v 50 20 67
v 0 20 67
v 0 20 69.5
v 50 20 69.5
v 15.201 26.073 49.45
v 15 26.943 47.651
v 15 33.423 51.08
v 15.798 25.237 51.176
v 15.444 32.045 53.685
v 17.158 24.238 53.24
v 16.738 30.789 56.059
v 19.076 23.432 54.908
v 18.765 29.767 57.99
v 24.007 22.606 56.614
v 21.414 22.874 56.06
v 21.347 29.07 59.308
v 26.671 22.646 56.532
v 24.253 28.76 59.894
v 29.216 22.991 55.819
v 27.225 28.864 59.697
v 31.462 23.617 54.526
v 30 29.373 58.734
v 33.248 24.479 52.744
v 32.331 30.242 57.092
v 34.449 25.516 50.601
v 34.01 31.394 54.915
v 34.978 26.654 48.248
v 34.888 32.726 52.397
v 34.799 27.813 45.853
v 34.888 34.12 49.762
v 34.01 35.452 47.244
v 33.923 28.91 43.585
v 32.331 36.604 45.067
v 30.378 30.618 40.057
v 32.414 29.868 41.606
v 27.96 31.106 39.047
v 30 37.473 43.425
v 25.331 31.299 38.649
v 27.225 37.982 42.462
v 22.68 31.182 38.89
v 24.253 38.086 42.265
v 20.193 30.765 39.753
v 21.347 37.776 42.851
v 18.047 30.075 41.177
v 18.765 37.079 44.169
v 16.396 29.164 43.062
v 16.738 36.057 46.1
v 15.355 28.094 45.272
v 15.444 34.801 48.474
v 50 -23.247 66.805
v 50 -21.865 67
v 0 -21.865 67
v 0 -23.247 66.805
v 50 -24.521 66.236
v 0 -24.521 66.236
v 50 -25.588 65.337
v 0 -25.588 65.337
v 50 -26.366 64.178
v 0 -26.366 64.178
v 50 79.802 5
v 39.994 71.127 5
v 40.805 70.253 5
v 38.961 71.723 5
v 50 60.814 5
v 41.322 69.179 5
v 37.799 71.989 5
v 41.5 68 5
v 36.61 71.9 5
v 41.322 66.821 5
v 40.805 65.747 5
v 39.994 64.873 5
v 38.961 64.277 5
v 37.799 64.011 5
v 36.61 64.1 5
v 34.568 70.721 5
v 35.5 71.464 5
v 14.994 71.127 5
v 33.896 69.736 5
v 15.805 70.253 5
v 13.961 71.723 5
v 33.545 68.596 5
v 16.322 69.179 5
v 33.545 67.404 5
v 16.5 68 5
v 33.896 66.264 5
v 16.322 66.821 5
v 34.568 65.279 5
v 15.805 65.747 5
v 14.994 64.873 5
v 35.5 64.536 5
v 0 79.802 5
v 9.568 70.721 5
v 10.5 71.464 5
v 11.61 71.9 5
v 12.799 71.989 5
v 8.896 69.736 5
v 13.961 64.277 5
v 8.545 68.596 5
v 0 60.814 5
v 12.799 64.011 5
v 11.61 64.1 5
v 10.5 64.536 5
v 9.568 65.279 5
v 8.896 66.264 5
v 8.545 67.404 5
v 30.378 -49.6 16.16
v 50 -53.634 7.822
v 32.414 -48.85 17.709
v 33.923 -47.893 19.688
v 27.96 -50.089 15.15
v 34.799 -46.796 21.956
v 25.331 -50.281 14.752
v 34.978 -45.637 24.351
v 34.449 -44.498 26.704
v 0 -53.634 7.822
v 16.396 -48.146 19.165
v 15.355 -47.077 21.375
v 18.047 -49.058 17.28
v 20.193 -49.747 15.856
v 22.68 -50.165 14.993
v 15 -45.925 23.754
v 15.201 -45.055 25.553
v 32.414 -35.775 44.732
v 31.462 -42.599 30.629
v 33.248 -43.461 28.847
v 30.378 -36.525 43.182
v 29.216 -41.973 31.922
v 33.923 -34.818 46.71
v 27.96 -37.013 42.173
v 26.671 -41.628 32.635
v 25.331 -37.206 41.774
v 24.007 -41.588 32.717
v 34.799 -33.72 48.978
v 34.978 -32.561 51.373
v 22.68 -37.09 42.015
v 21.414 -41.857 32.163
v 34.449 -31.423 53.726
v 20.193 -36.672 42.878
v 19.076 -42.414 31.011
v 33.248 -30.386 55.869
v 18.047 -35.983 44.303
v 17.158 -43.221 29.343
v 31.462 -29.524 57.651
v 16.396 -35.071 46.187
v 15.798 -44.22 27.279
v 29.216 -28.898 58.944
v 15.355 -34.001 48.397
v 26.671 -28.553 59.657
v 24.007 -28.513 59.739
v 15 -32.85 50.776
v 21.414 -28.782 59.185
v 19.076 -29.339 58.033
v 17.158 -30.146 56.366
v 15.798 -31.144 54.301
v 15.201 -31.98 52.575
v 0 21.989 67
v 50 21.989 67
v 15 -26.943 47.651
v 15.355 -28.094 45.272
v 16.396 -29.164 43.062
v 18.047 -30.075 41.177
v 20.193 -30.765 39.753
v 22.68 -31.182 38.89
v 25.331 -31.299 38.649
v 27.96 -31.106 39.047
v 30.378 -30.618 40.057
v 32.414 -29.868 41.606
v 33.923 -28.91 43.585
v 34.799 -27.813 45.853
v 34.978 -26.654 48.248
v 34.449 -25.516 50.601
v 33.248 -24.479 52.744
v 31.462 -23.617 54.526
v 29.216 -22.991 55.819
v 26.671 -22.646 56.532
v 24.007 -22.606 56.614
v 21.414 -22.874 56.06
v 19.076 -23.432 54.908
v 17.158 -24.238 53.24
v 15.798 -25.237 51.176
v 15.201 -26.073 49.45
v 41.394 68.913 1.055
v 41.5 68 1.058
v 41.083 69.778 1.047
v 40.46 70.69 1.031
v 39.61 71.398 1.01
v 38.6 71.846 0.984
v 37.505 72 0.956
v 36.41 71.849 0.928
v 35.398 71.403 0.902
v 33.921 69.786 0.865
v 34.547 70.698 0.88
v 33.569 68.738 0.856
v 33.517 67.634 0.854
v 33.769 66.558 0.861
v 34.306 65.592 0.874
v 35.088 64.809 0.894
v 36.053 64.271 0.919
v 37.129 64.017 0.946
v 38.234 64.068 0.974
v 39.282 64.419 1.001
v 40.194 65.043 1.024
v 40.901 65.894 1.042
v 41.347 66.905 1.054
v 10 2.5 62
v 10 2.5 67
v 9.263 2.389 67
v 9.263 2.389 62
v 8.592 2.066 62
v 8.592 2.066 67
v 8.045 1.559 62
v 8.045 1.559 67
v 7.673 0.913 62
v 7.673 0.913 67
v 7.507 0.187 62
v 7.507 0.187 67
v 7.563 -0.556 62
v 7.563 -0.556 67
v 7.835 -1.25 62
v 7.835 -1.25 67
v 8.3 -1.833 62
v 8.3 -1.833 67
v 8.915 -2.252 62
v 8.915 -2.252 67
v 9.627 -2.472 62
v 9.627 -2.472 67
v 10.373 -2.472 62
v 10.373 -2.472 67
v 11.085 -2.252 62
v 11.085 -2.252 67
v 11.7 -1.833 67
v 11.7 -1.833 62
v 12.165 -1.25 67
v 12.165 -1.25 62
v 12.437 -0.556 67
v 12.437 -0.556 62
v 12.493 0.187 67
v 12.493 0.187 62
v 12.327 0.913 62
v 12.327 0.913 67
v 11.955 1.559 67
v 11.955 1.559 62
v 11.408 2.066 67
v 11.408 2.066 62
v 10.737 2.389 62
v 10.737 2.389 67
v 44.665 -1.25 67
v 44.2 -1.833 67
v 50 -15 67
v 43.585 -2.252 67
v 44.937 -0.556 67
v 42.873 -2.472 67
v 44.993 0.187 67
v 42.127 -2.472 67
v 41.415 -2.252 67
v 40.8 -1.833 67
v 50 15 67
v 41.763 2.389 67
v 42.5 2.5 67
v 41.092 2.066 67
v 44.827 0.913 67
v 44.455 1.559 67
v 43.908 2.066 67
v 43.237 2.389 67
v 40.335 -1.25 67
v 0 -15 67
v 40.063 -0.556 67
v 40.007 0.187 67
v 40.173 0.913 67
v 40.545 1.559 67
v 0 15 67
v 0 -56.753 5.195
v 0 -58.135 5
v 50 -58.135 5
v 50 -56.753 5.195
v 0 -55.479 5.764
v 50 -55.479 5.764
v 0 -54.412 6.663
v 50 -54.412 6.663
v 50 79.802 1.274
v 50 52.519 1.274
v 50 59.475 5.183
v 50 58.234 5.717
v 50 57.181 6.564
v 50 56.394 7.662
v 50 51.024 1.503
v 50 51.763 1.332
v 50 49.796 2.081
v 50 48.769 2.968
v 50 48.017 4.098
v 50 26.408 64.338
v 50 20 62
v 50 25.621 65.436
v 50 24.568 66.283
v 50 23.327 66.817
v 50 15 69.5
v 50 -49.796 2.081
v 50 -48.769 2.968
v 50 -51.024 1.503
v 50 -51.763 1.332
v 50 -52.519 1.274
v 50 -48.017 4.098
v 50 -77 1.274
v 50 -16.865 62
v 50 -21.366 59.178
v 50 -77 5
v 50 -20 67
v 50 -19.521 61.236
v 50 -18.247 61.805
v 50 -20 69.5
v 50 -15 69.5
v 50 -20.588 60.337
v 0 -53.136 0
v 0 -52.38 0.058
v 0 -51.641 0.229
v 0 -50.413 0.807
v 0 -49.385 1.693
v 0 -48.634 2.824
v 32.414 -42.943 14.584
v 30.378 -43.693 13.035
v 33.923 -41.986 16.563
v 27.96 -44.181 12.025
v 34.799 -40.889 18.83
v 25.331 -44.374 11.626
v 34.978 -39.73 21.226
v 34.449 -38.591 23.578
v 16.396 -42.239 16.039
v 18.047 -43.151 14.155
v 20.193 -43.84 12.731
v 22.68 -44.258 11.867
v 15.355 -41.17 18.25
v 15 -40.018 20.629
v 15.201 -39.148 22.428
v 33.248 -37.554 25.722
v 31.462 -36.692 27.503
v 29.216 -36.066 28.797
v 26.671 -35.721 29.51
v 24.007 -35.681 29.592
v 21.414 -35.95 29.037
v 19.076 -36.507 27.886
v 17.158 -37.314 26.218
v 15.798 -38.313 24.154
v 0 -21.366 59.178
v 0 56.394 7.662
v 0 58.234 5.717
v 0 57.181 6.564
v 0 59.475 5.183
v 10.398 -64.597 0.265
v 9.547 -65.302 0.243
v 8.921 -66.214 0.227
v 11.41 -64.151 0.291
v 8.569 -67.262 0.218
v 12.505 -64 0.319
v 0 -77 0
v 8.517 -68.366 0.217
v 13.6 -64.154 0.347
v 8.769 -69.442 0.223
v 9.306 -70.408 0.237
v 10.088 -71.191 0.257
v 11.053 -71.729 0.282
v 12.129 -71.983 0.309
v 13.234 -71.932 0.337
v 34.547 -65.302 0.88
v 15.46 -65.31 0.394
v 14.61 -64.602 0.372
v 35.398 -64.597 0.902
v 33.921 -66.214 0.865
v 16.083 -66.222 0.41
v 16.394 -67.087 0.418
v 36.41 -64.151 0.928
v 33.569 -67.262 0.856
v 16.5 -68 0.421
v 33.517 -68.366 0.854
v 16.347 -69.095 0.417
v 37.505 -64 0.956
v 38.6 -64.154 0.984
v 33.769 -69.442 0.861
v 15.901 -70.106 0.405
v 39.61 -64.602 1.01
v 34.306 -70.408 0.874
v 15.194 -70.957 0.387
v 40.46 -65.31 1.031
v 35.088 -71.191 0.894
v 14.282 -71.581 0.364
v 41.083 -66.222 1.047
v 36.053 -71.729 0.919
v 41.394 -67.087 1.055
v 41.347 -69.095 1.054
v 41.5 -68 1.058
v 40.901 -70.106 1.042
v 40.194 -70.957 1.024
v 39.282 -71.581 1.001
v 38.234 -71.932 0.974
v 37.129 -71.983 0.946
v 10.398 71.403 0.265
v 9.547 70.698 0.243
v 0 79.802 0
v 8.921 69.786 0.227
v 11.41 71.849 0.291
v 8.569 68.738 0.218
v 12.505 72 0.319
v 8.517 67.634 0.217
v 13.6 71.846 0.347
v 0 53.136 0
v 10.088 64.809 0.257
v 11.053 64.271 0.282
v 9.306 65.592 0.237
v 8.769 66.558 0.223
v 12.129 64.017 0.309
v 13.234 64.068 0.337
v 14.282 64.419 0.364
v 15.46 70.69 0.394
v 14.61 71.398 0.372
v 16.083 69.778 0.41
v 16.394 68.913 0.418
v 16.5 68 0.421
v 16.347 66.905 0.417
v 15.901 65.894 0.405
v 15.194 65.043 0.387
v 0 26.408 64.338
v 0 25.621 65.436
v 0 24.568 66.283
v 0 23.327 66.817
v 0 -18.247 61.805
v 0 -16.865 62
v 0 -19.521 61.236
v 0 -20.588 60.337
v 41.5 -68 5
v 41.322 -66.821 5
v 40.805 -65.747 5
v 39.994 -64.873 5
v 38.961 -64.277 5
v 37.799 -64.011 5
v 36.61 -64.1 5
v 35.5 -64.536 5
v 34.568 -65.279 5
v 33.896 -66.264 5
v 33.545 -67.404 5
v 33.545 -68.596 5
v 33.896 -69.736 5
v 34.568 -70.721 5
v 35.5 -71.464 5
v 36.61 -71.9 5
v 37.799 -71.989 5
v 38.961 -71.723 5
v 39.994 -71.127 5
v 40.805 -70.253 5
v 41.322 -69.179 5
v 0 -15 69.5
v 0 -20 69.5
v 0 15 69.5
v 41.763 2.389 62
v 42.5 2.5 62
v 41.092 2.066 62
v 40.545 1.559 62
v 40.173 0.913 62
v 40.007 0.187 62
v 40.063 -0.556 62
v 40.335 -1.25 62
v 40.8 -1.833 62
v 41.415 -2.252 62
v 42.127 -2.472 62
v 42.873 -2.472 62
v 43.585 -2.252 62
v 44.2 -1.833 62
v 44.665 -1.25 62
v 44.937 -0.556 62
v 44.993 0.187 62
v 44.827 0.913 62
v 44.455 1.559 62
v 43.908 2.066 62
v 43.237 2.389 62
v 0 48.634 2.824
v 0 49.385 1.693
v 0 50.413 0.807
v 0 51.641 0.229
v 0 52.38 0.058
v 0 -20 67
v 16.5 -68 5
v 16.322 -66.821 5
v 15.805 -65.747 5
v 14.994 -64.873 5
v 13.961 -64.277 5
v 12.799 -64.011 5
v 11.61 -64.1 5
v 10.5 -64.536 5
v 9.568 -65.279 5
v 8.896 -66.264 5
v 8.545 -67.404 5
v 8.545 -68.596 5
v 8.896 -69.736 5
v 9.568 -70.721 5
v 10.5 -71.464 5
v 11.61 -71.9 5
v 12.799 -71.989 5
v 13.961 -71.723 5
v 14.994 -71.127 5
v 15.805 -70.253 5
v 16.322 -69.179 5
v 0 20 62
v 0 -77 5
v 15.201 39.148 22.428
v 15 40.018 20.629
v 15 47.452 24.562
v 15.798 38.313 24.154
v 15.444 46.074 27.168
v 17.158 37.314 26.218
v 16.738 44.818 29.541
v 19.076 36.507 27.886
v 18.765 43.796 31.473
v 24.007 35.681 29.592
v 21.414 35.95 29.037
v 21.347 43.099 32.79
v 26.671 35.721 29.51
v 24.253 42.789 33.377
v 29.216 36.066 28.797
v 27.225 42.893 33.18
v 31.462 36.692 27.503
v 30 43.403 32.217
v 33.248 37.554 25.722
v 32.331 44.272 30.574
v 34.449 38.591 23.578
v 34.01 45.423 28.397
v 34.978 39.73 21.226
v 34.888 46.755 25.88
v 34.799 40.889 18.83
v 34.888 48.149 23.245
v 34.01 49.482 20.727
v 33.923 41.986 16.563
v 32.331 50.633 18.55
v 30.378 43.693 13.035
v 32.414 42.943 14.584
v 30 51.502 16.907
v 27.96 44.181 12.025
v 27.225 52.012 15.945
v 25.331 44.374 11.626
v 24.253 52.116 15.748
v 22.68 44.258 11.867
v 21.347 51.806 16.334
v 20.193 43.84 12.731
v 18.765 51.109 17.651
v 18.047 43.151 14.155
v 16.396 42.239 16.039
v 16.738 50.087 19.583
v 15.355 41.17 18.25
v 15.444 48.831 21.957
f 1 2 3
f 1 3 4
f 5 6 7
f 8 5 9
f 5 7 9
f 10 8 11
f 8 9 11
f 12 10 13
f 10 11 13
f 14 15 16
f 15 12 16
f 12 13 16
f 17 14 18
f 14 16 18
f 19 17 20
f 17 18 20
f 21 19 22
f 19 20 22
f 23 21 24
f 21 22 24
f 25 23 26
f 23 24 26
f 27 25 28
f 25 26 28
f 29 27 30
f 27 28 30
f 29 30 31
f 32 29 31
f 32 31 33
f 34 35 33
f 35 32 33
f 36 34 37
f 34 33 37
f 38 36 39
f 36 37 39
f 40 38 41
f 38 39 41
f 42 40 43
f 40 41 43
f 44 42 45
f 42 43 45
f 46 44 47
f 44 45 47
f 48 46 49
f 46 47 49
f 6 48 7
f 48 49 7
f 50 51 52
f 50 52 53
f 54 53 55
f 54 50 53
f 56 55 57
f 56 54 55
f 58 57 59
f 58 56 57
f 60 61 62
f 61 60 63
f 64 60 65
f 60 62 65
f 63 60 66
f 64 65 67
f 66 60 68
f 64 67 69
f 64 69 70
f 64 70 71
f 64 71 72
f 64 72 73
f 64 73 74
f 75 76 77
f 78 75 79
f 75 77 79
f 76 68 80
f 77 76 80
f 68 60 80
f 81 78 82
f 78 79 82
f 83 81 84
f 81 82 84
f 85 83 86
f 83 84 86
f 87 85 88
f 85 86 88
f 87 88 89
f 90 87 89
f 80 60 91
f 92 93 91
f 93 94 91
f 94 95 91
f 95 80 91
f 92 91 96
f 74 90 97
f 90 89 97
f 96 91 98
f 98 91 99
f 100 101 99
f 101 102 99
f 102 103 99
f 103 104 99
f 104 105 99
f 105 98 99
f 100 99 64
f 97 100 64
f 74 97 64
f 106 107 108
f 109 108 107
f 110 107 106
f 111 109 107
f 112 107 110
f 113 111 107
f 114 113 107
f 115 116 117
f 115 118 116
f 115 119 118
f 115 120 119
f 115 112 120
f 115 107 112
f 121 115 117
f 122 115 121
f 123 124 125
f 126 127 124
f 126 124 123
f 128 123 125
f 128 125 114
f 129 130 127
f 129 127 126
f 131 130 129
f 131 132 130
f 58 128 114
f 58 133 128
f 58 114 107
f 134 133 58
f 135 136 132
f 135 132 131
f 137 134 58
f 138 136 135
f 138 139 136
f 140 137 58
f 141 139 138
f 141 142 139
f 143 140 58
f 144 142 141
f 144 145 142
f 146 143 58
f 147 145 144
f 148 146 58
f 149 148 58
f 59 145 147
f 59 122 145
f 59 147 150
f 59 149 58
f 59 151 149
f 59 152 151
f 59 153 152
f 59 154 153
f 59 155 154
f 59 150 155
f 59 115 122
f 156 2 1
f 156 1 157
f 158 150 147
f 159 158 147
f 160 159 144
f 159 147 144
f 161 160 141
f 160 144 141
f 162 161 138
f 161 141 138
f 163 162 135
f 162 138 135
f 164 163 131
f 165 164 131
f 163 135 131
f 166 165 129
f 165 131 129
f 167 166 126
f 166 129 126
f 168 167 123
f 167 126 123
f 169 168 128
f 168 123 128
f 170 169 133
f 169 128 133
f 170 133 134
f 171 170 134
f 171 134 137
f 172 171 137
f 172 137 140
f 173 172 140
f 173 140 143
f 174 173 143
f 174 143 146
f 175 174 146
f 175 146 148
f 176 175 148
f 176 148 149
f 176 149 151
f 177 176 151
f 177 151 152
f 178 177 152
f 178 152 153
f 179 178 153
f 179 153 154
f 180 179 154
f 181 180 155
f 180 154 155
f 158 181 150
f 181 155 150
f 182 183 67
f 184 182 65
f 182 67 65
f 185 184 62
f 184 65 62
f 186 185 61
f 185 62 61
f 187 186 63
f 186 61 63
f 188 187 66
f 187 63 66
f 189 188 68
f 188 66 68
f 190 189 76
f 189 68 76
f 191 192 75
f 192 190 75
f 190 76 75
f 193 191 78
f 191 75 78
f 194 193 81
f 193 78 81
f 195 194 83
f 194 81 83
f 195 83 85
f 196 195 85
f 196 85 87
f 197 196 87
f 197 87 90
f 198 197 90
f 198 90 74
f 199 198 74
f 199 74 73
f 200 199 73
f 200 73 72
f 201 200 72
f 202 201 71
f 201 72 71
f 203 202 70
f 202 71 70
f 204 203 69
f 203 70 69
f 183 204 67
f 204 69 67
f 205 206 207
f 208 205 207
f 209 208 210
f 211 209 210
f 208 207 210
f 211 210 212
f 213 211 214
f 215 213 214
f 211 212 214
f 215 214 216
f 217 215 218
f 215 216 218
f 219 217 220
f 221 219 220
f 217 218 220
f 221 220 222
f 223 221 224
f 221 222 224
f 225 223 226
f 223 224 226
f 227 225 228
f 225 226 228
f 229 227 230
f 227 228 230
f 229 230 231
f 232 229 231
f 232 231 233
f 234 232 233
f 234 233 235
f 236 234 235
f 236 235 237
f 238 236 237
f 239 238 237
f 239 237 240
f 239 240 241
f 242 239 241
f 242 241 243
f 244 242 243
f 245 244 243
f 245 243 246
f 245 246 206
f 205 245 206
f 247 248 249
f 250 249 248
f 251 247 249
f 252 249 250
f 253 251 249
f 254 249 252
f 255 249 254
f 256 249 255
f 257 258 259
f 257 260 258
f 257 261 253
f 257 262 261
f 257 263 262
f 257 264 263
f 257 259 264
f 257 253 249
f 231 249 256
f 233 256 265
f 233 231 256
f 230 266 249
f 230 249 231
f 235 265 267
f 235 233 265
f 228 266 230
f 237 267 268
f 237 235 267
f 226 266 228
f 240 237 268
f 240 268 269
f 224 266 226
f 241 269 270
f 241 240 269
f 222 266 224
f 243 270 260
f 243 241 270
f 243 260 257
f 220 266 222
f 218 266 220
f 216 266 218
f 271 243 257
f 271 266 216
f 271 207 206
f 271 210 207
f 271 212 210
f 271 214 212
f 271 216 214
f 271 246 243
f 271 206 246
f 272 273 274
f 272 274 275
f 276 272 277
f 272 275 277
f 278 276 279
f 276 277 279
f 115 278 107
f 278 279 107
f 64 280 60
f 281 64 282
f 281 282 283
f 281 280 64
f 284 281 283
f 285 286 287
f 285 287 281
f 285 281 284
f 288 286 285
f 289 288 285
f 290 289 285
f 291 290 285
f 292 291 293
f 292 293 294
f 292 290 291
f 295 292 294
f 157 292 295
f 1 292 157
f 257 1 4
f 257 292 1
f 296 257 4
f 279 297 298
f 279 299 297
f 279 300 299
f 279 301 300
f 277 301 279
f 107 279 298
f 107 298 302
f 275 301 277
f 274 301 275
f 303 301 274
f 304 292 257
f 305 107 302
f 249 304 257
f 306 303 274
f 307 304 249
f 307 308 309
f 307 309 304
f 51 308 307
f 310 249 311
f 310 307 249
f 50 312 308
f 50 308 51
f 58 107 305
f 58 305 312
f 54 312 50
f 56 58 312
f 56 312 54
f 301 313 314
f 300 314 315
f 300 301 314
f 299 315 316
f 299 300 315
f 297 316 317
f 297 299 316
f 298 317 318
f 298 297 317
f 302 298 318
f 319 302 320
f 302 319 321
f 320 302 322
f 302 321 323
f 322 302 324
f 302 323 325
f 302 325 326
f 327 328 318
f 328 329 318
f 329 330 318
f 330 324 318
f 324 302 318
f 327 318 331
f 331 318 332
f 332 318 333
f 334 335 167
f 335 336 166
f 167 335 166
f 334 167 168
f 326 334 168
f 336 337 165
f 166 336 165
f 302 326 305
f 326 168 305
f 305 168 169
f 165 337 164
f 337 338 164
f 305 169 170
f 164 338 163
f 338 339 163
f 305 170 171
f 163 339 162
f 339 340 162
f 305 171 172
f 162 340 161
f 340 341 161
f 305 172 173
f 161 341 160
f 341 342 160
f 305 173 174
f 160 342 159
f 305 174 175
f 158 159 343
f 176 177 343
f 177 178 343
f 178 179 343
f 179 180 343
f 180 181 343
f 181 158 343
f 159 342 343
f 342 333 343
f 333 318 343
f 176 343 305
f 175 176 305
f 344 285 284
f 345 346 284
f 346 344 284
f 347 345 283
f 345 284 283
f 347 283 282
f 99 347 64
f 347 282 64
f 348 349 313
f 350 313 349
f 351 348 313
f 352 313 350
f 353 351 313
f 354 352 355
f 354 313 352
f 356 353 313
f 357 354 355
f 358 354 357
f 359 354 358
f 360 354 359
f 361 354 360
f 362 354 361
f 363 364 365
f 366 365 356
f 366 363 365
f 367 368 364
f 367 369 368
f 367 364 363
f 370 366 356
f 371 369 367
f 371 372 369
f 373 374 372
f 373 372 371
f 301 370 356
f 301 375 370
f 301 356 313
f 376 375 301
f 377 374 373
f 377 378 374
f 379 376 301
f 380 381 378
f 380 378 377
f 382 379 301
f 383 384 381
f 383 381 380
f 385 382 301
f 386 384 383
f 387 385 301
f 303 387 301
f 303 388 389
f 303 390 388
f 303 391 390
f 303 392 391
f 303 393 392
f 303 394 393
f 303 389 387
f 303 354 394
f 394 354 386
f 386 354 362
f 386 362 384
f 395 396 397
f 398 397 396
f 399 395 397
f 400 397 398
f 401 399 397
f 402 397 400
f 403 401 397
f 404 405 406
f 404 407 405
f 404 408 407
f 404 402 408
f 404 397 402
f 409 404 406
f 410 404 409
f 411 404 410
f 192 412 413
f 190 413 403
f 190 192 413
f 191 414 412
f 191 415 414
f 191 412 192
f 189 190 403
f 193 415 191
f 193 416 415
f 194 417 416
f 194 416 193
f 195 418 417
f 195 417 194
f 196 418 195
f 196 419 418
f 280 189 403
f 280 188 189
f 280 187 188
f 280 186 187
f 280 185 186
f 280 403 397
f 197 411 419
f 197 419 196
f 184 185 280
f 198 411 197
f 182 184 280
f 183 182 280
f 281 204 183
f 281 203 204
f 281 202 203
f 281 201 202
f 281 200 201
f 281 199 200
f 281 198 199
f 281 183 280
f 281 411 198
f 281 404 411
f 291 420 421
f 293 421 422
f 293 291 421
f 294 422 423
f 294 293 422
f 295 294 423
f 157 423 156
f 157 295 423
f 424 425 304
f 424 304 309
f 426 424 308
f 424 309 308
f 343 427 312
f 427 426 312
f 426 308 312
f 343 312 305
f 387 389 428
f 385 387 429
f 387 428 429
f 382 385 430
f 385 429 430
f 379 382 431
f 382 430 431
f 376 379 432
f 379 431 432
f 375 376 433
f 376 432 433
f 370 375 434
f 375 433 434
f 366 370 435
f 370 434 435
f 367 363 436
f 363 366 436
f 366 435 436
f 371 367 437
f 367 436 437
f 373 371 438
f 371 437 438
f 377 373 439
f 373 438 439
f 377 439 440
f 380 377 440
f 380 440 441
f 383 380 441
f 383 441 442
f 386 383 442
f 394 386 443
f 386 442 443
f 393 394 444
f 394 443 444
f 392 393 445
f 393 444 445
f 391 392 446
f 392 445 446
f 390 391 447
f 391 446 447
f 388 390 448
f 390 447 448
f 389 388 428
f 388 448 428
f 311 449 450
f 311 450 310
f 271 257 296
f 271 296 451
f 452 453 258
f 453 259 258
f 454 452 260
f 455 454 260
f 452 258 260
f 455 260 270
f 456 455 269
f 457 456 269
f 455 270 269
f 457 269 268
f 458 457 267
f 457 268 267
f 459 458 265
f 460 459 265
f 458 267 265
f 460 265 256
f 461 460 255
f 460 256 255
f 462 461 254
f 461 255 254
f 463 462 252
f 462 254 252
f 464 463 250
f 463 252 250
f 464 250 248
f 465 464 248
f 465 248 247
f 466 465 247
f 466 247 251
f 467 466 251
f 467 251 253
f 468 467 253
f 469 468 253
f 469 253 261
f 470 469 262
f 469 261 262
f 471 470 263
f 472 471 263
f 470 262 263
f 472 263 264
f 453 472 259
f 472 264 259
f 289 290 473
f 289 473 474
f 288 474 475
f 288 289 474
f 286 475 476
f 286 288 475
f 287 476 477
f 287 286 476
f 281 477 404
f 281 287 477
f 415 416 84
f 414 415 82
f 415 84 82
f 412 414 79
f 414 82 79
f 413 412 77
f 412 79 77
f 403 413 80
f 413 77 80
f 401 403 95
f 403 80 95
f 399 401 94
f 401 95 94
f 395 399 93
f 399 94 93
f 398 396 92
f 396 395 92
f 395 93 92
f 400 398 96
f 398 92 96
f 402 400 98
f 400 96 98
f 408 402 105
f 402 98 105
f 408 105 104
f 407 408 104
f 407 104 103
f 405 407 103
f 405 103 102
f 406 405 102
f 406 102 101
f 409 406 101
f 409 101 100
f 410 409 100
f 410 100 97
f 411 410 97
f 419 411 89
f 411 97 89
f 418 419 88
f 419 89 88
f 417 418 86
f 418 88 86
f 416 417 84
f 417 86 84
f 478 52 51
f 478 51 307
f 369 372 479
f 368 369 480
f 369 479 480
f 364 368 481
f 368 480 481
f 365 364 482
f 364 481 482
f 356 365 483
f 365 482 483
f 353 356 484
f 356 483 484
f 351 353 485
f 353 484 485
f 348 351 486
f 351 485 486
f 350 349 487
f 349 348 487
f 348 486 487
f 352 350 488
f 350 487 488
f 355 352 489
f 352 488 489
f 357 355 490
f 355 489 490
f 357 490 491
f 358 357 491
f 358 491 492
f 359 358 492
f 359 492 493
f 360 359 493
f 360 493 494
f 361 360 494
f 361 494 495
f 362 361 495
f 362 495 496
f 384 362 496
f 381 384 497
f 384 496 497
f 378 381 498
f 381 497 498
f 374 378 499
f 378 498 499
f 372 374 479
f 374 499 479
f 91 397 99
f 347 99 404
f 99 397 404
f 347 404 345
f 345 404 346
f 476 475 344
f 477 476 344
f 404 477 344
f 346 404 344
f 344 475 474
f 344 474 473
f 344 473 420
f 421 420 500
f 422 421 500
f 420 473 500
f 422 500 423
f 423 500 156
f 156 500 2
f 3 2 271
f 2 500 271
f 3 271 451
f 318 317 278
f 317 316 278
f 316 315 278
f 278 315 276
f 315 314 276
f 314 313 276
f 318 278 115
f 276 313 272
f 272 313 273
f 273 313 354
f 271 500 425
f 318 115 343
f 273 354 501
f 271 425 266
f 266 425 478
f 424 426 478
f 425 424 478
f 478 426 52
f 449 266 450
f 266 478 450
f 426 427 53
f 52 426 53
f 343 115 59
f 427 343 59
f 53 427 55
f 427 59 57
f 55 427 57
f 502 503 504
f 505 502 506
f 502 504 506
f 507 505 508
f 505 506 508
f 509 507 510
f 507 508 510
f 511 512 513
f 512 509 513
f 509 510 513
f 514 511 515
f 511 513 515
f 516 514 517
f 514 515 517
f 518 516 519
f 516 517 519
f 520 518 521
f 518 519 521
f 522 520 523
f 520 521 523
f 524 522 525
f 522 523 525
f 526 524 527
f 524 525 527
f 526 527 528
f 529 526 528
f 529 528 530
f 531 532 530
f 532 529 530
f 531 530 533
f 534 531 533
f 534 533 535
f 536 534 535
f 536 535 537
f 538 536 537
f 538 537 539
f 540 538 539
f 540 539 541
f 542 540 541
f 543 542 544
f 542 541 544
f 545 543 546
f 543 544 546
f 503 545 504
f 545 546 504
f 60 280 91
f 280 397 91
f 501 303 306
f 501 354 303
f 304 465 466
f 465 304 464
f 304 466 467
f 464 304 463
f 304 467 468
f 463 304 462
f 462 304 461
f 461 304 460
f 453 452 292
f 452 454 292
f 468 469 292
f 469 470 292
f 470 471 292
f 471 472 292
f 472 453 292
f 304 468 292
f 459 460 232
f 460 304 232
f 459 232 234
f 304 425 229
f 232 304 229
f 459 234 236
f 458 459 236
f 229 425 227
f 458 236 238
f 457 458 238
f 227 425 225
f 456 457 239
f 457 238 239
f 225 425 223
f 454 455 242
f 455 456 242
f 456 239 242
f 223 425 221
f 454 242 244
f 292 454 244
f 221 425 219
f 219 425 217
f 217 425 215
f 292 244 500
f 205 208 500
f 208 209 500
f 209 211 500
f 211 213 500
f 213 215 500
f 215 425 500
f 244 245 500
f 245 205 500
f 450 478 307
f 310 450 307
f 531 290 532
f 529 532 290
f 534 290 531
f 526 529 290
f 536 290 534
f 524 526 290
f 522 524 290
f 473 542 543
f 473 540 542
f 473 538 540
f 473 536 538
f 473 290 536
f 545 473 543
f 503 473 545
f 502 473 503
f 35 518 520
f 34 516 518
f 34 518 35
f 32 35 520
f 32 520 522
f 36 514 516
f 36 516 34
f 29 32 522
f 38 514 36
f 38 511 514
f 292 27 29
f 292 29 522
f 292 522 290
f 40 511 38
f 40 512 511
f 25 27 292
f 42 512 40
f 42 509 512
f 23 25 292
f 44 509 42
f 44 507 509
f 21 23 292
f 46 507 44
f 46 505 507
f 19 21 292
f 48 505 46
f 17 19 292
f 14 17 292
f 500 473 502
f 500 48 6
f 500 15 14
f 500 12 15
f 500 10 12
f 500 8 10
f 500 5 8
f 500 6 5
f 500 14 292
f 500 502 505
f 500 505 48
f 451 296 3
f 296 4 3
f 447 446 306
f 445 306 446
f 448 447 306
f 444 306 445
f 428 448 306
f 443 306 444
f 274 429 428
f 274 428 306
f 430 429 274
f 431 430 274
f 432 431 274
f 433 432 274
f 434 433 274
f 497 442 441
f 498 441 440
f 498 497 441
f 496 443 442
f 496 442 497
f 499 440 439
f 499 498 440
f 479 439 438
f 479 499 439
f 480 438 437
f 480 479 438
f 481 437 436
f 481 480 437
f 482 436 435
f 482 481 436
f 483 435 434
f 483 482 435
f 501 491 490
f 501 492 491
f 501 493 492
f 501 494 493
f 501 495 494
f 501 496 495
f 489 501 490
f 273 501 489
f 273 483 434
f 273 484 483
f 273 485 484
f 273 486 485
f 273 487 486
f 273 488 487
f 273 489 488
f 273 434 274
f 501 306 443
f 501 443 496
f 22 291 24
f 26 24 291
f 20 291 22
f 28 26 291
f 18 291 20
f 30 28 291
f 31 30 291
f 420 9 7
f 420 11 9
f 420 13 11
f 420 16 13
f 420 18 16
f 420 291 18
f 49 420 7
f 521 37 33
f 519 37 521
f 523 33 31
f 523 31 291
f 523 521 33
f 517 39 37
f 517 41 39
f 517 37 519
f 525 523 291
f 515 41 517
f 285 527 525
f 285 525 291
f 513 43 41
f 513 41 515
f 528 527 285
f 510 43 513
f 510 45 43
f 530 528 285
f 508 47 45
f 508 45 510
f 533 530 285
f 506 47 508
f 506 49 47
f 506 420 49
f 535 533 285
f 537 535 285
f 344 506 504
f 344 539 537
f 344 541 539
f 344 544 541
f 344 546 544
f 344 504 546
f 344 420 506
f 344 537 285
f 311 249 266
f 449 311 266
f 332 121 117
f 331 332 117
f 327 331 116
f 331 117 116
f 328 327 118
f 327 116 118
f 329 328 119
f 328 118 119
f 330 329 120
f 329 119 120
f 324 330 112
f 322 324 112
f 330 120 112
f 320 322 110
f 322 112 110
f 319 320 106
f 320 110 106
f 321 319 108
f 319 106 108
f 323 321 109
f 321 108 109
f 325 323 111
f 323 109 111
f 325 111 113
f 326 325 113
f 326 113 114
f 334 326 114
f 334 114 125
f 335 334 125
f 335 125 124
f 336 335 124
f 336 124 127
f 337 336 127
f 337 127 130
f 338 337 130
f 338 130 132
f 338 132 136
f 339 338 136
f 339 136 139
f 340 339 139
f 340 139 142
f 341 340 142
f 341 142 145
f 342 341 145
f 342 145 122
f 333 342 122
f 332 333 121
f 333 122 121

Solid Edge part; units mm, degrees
sketch "Sketch1" plane through (0, 0, 0) normal (1, 0, 0) x (0, 1, 0)
  line L0 (-50, 0) -> (-20, 62)
  line L1 (-20, 62) -> (20, 62)
  line L2 (50, 0) -> (20, 62)
  line L3 (50, 0) -> (79.8022, 0)
  line L4 (79.8022, 0) -> (79.8022, 5)
  line L5 (79.8022, 5) -> (57.8022, 5)
  line L6 (25, 67) -> (57.8022, 5)
  line L7 (-25, 67) -> (25, 67)
  line L8 (-55, 5) -> (-25, 67)
  line L9 (-77, 5) -> (-55, 5)
  line L10 (-77, 0) -> (-77, 5)
  line L11 (-77, 0) -> (-50, 0)
  dimension "D1" = 100
  dimension "D2" = 40
  dimension "D3" = 62
  dimension "D4" = 5
  dimension "D5" = 22
  dimension "D6" = 5
  dimension "D7" = 5
  dimension "D8" = 5
  dimension "D9" = 5
  dimension "D10" = 27
extrude "Protrusion1" add sketch "Sketch1" along normal blind 50
sketch "Sketch2" plane through (25, 0, 67) normal (0, 0, 1) x (1, 0, 0)
  line L0 (-25, 20) -> (25, 20)
  line L1 (25, 20) -> (25, 15)
  line L2 (25, 15) -> (-25, 15)
  line L3 (-25, 15) -> (-25, 20)
  line L4 (-25, -20) -> (25, -20)
  line L5 (25, -20) -> (25, -15)
  line L6 (25, -15) -> (-25, -15)
  line L7 (-25, -15) -> (-25, -20)
  dimension "D1" = 15
  dimension "D2" = 5
extrude "ExtrudedProtrusion_2" add sketch "Sketch2" along normal blind 2.5
sketch "Sketch3" plane through (25, -66, 5) normal (0, 0, 1) x (1, 0, 0)
  circle A0 centre (-12.5, -2) radius 4
  circle A1 centre (12.5, -2) radius 4
  dimension "D1" = 8
  dimension "D2" = 8
  dimension "D3" = 25
  dimension "D4" = 12.5
  dimension "D5" = 9
extrude "Cutout1" cut sketch "Sketch3" against normal up to next
mirror "Mirror1" about plane through (0, 0, 0) normal (0, -1, 0) of "Cutout1"
sketch "Sketch4" plane through (25, 0, 67) normal (0, 0, 1) x (0, 1, 0)
  circle A0 centre (0, 15) radius 2.5
  circle A1 centre (0, -17.5) radius 2.5
  dimension "D1" = 5
  dimension "D2" = 5
  dimension "D3" = 30
  dimension "D4" = 10
extrude "Cutout2" cut sketch "Sketch4" against normal up to next
sketch "Sketch5" plane through (0, 0, 0) normal (0, 1, 0) x (-1, 0, 0)
  line L0 (0, 0) -> (-66.0658, 1.6838)
  line L1 (-66.0658, 1.6838) -> (-66.0658, 0)
  line L2 (-66.0658, 0) -> (0, 0)
extrude "ExtrudedCutout_3" cut sketch "Sketch5" along normal mid plane 208
fillet "Round_1" radius 5 7 edges at (25, 25, 67) (25, 49.6917, 0.6372) (25, 57.8022, 5) (25, -25, 67) (25, -20, 62) (25, -49.6917, 0.6372) (25, -55, 5)
sketch "Sketch6" plane through (25, 41.4011, 36) normal (0, 0.8839, 0.4677) x (-1, 0, 0)
  circle A0 centre (0, 17.06) radius 10
  circle A1 centre (0, -12.94) radius 10
  dimension "D1" = 20
  dimension "D2" = 20
  dimension "D3" = 30
  dimension "D4" = 15
extrude "Cutout3" cut sketch "Sketch6" against normal up to next
mirror "Mirror2" about plane through (0, 0, 0) normal (0, -1, 0) of "Cutout3"
properties material "Stainless steel"
